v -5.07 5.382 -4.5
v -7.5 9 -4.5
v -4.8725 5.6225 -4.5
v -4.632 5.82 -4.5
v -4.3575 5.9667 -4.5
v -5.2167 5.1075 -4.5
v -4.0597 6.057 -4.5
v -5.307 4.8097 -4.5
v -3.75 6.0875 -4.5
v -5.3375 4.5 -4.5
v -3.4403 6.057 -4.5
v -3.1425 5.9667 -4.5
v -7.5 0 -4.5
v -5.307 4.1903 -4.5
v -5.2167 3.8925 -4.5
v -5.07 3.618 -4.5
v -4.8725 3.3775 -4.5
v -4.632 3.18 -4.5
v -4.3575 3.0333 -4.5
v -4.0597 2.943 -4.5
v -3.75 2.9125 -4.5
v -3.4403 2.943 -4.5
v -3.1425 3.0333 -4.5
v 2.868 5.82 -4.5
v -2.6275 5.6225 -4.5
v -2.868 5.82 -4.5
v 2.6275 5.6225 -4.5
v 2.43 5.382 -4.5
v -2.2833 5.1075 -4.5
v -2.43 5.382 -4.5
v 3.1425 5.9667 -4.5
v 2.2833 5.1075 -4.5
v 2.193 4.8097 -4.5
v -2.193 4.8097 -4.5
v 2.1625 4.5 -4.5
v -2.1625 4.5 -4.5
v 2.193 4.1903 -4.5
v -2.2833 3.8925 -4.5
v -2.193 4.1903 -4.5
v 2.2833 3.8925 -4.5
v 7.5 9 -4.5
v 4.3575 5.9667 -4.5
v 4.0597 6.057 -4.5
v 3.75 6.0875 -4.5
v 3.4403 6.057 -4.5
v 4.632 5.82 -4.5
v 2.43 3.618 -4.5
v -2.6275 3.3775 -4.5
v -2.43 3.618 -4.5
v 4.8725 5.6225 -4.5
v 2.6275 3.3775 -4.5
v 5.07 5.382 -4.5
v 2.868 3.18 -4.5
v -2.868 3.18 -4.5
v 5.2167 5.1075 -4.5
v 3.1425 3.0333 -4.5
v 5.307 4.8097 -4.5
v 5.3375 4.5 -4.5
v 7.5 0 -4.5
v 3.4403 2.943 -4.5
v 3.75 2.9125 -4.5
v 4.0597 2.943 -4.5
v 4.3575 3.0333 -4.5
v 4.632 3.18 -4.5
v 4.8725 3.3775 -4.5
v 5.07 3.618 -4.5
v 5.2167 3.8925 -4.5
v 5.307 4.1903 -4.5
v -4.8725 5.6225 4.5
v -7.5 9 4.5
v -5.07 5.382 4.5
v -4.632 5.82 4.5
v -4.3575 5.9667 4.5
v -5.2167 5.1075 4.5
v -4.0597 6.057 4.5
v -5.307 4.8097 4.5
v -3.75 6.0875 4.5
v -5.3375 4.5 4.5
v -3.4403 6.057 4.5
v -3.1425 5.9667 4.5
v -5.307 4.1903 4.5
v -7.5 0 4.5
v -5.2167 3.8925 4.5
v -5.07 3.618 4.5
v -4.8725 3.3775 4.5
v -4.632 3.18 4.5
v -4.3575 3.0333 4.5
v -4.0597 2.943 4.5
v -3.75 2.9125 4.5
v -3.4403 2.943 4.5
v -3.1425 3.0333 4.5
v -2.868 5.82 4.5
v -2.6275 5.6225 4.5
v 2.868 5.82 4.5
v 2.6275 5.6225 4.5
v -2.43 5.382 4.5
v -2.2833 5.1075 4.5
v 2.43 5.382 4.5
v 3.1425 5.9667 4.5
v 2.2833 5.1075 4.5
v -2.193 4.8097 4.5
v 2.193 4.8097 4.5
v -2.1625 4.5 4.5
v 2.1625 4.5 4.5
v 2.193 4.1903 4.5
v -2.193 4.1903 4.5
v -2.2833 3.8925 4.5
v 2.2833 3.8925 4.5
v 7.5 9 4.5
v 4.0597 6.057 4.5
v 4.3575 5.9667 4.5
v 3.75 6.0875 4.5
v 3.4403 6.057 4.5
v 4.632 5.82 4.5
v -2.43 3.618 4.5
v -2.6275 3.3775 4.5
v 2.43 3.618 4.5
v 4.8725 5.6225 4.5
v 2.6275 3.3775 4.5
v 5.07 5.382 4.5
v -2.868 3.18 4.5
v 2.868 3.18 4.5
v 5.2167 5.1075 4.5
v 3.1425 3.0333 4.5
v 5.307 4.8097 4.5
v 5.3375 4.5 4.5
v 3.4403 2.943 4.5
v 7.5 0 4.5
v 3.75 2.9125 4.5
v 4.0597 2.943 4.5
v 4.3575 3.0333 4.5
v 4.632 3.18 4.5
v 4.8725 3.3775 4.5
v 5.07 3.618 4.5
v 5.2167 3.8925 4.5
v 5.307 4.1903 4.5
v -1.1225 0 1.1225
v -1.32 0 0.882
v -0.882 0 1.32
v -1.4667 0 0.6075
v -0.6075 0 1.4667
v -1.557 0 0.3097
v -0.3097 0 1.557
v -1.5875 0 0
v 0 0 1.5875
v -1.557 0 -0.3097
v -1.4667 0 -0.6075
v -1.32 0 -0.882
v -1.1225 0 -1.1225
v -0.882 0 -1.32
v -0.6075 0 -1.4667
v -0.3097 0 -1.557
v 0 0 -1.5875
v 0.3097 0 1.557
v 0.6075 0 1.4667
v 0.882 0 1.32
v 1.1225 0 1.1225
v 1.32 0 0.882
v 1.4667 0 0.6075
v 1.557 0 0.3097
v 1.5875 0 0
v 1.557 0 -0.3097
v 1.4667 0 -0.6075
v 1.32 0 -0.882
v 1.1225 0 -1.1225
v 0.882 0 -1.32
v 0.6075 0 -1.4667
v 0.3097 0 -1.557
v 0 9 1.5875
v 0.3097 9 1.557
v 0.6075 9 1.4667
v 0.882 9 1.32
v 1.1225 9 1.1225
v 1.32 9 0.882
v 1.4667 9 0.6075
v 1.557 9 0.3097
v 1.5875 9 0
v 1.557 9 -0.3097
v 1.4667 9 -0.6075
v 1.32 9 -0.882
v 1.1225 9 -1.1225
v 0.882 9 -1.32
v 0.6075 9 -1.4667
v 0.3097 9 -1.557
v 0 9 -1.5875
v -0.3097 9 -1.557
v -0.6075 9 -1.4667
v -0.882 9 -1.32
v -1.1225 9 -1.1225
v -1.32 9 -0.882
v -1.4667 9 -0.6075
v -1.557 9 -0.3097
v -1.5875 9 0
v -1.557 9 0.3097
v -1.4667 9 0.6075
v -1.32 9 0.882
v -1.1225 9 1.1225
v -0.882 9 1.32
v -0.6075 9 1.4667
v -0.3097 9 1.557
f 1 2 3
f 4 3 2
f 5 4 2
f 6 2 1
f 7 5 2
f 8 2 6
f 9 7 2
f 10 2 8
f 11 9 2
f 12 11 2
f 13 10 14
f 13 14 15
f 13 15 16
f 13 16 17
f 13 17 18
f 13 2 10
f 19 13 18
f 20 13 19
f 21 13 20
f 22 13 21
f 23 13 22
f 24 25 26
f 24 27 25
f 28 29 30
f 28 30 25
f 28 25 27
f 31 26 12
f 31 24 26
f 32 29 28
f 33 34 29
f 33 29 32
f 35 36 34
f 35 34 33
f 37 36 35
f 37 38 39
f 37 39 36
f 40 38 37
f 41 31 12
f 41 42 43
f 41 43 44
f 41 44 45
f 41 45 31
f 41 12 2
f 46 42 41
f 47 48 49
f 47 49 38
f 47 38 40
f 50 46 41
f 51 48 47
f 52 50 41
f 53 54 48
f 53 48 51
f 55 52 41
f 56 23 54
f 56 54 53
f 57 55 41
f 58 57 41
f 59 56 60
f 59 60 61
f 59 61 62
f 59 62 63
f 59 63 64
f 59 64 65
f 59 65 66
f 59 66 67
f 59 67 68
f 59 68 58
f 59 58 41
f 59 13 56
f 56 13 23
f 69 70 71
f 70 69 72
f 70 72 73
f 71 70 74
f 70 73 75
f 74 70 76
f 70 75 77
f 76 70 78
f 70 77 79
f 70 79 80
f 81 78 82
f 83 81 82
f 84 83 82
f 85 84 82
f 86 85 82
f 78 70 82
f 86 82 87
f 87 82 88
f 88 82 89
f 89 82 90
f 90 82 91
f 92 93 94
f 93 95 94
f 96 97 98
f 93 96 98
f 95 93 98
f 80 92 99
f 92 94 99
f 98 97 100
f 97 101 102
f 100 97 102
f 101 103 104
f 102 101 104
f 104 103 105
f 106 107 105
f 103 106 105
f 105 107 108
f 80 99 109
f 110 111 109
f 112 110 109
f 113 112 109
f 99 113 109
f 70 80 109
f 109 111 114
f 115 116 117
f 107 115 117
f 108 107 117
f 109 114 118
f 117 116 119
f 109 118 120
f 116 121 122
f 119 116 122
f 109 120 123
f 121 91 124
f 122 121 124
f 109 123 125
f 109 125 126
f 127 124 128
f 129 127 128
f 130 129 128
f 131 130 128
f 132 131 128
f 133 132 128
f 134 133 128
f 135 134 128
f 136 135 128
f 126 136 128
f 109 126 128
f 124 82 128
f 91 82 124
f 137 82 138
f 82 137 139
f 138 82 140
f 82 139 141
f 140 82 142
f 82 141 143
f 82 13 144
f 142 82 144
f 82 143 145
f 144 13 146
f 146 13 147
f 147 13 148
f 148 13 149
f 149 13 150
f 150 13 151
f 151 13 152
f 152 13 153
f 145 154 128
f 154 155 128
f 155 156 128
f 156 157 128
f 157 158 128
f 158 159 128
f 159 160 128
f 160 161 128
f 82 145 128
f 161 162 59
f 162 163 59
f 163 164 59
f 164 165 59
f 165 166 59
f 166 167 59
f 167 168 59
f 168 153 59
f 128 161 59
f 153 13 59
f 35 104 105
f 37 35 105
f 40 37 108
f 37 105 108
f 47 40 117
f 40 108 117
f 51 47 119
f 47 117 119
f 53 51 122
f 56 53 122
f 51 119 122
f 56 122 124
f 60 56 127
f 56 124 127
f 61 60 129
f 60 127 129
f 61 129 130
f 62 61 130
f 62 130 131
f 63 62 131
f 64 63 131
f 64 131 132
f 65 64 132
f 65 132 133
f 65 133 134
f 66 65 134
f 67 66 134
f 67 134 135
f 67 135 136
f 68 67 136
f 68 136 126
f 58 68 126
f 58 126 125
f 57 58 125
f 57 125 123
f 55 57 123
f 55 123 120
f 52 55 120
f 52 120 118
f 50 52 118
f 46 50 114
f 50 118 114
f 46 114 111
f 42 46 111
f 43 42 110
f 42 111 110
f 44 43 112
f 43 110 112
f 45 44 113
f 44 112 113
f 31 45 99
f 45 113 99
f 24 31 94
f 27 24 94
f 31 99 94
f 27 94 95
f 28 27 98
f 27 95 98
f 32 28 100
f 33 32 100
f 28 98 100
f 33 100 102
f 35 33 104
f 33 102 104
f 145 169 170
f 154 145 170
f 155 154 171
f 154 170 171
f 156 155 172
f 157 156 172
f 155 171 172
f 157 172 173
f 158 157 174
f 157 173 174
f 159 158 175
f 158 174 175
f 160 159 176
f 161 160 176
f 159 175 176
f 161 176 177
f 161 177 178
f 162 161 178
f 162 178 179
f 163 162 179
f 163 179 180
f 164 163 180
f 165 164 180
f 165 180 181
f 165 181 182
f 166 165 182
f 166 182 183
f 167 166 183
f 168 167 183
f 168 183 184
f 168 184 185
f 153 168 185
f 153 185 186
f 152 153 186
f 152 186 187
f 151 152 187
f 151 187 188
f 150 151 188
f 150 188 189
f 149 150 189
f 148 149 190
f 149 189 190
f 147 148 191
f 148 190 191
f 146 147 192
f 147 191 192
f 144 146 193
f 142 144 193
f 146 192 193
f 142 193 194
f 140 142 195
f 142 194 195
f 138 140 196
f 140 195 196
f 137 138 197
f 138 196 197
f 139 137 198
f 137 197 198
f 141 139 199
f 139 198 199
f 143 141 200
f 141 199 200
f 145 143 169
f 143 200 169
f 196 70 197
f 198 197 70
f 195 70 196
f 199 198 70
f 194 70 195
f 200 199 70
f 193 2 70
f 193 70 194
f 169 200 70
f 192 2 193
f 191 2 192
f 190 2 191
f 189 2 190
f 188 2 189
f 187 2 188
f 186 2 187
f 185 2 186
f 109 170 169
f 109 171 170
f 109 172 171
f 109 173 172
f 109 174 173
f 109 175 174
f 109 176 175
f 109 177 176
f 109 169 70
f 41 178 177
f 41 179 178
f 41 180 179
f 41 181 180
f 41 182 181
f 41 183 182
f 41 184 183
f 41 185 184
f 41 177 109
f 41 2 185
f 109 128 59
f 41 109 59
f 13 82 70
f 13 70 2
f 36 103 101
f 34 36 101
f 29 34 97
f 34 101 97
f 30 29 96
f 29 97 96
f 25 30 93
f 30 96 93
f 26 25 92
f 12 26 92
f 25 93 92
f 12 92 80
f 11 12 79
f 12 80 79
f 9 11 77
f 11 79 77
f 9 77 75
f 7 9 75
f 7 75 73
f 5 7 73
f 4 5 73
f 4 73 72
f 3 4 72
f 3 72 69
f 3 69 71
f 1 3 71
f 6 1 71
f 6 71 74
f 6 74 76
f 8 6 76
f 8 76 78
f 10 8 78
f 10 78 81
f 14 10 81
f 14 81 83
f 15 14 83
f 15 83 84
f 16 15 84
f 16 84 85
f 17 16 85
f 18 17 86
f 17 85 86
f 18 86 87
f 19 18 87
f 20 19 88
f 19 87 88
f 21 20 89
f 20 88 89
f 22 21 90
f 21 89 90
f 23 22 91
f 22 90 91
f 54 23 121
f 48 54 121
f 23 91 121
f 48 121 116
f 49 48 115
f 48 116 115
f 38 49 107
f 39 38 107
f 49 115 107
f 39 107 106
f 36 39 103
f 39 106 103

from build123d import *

# Parameters (mm, degrees)
SKETCH1_W           = 15
SKETCH1_H           = 9
BOSS_EXTRUDE1_DEPTH = 9
SKETCH2_R           = 1.5875
CUT_EXTRUDE1_DEPTH  = 13.549900398
SKETCH3_R           = 1.5875
CUT_EXTRUDE2_DEPTH  = 15.773286703


with BuildPart() as part:
    # Sketch1 → Boss-Extrude1 (new body)
    with BuildSketch(Plane(origin=(0, 0, 0), x_dir=(1, 0, 0), z_dir=(0, 1, 0))):
        Rectangle(SKETCH1_W, SKETCH1_H)
    extrude(amount=BOSS_EXTRUDE1_DEPTH)

    # Sketch2 → Cut-Extrude1 (cut, through all)
    with BuildSketch(Plane(origin=(0, 9, 0), x_dir=(1, 0, 0), z_dir=(0, 1, 0))):
        with Locations(Location((0, 0, 0), (0, 0, 270))):
            Circle(SKETCH2_R)
    extrude(amount=-CUT_EXTRUDE1_DEPTH, mode=Mode.SUBTRACT)

    # Sketch3 → Cut-Extrude2 (cut, through all)
    with BuildSketch(Plane.XY.offset(4.5)):
        with Locations((-3.75, 4.5)):
            Circle(SKETCH3_R)
        with Locations(Location((3.75, 4.5, 0), (0, 0, 180))):
            Circle(SKETCH3_R)
    extrude(amount=-CUT_EXTRUDE2_DEPTH, mode=Mode.SUBTRACT)


solid = part.part
